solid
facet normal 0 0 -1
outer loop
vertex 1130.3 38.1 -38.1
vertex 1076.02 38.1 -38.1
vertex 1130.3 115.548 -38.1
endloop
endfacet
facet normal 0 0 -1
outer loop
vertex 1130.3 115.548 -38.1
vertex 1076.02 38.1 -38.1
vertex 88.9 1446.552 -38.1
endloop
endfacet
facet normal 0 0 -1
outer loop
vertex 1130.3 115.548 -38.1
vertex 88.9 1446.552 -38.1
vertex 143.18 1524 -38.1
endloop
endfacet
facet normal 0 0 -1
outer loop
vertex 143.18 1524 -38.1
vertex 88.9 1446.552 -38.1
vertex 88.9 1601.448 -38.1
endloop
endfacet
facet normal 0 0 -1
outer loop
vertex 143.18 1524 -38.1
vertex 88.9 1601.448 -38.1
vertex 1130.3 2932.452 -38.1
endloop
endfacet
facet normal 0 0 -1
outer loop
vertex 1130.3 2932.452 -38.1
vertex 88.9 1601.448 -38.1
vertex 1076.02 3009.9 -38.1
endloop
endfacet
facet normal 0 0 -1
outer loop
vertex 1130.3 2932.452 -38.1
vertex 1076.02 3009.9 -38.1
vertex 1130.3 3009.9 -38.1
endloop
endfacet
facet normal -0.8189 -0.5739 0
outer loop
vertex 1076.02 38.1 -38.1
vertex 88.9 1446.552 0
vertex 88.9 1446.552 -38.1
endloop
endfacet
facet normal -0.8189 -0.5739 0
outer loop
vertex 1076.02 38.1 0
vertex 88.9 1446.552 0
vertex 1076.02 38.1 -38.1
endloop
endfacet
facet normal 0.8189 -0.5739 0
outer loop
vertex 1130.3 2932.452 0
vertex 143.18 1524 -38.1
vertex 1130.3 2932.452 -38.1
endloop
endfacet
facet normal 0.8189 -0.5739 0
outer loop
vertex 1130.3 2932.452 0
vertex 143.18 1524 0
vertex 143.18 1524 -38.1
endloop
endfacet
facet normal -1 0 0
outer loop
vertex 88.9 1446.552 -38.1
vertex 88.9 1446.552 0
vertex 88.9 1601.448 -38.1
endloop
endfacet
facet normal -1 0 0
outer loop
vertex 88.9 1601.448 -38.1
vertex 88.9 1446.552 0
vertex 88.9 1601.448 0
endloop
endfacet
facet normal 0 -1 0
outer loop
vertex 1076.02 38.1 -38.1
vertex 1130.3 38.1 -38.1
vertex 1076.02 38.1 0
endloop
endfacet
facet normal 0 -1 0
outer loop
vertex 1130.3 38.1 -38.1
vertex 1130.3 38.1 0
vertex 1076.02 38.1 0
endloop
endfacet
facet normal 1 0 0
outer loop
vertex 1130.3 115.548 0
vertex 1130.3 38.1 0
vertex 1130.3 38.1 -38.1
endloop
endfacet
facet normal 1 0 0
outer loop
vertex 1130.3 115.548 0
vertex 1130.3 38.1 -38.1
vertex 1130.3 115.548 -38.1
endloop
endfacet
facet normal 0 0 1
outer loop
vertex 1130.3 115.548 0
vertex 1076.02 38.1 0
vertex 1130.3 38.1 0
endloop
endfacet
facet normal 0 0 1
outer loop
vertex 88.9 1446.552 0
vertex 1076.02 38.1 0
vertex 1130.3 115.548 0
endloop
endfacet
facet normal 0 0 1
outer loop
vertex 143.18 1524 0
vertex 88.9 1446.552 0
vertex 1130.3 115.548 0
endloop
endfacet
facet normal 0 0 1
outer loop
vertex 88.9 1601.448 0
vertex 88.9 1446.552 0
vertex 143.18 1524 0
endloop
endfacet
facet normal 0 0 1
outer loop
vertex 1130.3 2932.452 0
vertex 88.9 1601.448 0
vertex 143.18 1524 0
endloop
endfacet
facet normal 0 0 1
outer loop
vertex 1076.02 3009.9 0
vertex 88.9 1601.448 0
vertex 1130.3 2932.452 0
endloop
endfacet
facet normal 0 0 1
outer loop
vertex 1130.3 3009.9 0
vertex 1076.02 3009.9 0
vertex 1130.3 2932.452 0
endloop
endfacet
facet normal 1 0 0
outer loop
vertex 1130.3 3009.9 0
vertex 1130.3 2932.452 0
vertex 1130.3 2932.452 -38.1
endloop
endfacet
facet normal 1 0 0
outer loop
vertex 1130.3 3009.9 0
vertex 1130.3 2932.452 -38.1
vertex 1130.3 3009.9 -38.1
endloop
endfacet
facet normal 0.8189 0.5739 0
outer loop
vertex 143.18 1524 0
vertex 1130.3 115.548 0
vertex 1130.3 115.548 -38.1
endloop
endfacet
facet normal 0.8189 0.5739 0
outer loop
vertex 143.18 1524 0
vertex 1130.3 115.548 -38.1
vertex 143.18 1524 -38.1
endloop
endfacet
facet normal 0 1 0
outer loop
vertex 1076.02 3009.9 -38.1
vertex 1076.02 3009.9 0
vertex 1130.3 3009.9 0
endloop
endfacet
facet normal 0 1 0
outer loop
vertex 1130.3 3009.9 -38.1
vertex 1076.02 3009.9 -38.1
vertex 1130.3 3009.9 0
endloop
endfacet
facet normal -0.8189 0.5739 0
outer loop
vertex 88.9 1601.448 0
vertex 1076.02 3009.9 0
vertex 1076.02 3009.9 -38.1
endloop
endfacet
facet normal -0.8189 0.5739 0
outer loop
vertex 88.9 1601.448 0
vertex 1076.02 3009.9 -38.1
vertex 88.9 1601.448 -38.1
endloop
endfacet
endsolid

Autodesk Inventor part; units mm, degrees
ref_plane "YZ Plane" through (0, 0, 0) normal (1, 0, 0) x (0, 1, 0)
ref_plane "XZ Plane" through (0, 0, 0) normal (0, 1, 0) x (-1, 0, 0)
ref_plane "XY Plane" through (0, 0, 0) normal (0, 0, 1) x (1, 0, 0)
sketch "Sketch1" plane through (0, 0, 0) normal (0, 0, 1) x (1, 0, 0)
  line L0 (88.9, 0) -> (88.9, 3048) projected
  line L1 (1130.3, 38.1) -> (88.9, 38.1) projected
  line L2 (1130.3, 0) -> (1130.3, 3048) projected
  line L3 (88.9, 3009.9) -> (1130.3, 3009.9) projected
  line L4 (1130.3, 115.5482) -> (143.1799, 1524)
  line L5 (143.1799, 1524) -> (1130.3, 2932.4518)
  line L6 (1076.0201, 3009.9) -> (88.9, 1601.4482)
  line L7 (88.9, 1446.5518) -> (1076.0201, 38.1)
  line L8 (1076.0201, 38.1) -> (1130.3, 38.1)
  line L9 (1130.3, 38.1) -> (1130.3, 115.5482)
  line L10 (1130.3, 2932.4518) -> (1130.3, 3009.9)
  line L11 (1076.0201, 3009.9) -> (1130.3, 3009.9)
  line L12 (88.9, 1601.4482) -> (88.9, 1446.5518)
  line L13 (88.9, 1446.5518) -> (88.9, 1601.4482)
  point P0 (0, 0)
extrude "Extrusion1" add sketch "Sketch1" against normal blind 38.1 contours L0 L6 L3 L2 L5 L4 L1 L7
properties part number "side2"
